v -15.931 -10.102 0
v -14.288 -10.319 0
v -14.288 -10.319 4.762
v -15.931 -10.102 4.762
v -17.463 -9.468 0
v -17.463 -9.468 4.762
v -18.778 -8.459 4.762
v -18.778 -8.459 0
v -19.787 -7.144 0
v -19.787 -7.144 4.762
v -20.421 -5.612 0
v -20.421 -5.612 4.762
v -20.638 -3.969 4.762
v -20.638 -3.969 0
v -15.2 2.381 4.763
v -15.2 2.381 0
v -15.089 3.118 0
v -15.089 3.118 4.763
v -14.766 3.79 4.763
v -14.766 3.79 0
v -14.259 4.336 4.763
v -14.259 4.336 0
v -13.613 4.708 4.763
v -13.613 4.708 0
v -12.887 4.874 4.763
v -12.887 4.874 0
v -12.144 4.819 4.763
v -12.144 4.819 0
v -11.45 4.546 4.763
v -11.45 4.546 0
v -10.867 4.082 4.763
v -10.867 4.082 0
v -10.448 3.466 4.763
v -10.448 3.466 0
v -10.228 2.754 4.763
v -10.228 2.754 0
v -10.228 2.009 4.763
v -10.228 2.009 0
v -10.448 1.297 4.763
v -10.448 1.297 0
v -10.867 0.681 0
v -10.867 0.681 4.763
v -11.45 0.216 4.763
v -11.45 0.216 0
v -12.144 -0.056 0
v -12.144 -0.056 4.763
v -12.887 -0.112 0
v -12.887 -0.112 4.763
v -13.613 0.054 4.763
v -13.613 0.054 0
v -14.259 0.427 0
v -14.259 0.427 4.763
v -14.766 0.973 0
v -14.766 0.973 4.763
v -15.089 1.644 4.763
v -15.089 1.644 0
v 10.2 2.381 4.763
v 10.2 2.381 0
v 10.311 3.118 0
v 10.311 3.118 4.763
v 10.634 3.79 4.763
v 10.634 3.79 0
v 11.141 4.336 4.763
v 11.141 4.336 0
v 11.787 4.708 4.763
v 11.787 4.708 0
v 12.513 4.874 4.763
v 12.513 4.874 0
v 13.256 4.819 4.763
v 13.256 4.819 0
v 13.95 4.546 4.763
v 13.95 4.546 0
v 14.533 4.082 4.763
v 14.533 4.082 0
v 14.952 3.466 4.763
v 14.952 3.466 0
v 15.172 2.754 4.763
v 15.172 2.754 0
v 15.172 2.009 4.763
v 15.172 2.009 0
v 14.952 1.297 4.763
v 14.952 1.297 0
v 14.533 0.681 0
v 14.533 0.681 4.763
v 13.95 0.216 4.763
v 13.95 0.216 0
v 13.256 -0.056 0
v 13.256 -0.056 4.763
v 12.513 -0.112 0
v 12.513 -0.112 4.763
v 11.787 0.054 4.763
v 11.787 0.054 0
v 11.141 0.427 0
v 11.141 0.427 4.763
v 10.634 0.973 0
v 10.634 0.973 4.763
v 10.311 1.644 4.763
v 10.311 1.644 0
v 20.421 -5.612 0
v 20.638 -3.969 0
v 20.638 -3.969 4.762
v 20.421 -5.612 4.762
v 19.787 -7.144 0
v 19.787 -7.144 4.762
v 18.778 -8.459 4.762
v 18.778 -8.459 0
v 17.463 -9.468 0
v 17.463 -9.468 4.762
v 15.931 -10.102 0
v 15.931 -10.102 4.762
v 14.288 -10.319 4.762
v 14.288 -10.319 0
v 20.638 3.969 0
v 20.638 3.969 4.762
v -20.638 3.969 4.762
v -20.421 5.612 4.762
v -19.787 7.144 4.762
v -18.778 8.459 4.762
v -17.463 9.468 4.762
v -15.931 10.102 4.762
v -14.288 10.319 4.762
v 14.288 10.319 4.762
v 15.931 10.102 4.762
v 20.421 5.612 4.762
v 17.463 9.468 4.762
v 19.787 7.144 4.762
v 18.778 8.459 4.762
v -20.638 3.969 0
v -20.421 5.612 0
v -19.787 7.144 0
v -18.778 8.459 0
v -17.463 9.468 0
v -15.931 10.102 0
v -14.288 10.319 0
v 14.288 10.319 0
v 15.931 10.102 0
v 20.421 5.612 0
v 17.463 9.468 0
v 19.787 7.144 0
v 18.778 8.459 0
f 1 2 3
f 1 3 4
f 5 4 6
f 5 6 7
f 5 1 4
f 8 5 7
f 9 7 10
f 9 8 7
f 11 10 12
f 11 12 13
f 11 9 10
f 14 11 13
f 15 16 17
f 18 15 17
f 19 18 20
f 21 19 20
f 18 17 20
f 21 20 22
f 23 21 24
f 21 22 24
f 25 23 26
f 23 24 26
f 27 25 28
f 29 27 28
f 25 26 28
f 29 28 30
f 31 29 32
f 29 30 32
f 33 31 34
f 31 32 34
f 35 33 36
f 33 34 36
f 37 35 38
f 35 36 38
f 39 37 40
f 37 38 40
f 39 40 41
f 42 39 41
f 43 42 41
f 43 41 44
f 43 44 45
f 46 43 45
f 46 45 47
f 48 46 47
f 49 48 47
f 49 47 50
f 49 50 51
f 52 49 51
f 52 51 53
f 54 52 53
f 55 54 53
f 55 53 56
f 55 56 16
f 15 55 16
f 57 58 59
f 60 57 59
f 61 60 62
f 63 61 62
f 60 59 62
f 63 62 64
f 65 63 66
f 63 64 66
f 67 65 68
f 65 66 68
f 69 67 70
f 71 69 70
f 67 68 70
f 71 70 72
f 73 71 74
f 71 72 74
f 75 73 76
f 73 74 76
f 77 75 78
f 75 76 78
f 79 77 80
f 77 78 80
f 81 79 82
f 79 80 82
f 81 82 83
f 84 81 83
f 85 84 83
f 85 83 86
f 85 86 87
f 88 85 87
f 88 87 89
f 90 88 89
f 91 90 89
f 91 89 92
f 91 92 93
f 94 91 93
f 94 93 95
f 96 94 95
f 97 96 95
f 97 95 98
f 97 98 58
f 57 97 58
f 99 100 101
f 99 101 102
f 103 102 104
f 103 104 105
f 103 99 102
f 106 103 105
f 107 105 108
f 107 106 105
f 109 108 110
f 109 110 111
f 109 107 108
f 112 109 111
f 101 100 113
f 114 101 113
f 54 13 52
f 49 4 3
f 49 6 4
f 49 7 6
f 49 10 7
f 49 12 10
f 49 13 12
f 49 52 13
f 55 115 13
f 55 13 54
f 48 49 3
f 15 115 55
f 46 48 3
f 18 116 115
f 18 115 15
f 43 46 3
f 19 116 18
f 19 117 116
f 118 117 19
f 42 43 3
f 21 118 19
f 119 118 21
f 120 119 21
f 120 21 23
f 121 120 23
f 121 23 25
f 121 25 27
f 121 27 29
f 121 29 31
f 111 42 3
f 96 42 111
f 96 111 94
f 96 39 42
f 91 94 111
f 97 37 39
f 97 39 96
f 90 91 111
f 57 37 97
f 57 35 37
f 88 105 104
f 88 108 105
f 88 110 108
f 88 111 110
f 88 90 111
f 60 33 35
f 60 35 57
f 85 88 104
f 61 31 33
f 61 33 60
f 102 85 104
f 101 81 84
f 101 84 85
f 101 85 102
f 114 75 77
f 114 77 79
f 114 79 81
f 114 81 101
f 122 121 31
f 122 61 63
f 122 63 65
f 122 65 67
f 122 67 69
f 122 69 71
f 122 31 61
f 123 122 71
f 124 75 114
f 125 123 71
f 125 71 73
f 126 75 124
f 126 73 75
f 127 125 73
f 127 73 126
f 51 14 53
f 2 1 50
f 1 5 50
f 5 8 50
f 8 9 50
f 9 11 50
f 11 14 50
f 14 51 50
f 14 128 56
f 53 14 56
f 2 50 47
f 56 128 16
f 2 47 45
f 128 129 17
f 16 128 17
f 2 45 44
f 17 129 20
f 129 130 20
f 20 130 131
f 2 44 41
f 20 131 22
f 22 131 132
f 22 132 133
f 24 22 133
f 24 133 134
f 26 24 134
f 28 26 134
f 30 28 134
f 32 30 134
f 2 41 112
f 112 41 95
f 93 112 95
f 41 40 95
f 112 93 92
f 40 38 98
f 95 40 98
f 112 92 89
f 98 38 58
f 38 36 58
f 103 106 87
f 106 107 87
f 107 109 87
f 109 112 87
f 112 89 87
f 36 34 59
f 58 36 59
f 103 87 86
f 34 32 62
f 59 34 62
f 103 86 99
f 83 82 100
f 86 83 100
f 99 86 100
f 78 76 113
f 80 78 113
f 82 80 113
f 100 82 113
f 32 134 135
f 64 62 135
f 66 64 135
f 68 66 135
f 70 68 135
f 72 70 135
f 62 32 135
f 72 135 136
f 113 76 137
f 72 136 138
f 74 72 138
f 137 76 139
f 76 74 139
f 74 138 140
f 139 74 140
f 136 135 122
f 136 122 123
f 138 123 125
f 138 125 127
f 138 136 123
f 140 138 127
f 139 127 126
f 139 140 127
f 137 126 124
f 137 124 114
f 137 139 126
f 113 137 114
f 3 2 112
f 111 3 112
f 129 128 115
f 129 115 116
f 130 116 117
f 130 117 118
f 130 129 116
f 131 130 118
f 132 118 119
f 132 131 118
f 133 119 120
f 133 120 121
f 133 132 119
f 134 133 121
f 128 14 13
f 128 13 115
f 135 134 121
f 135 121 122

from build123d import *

# Parameters (mm, degrees)
SKETCH1_W             = 41.275
SKETCH1_H             = 20.6375
BASE_FLANGE1_DEPTH    = 4.7625
BREAK_CORNER1_DEPTH   = 4.7625
M6X1_0_TAPPED_HOLE1_D = 5


# Read off the part's stored shape, not the designer's step: Break-Corner1
# Sheet-metal steps are written as plain solids
with BuildPart() as part:
    # Sketch1 → Base-Flange1 (new body)
    with BuildSketch(Plane.XY):
        Rectangle(SKETCH1_W, SKETCH1_H)
    extrude(amount=BASE_FLANGE1_DEPTH)

    # Break-Corner1 outline → Break-Corner1 (cut)
    with BuildSketch(Plane.XY):
        with BuildLine():
            Line((-20.6375, 10.31875), (-20.6375, 3.96875))
            ThreePointArc((-20.6375, 3.96875), (-18.777628061, 8.458878061), (-14.2875, 10.31875))
            Line((-14.2875, 10.31875), (-20.6375, 10.31875))
        make_face()
        with BuildLine():
            ThreePointArc((-14.2875, -10.31875), (-18.777628061, -8.458878061), (-20.6375, -3.96875))
            Line((-20.6375, -3.96875), (-20.6375, -10.31875))
            Line((-20.6375, -10.31875), (-14.2875, -10.31875))
        make_face()
        with BuildLine():
            Line((20.6375, 10.31875), (14.2875, 10.31875))
            ThreePointArc((14.2875, 10.31875), (18.777628061, 8.458878061), (20.6375, 3.96875))
            Line((20.6375, 3.96875), (20.6375, 10.31875))
        make_face()
        with BuildLine():
            ThreePointArc((20.6375, -3.96875), (18.777628061, -8.458878061), (14.2875, -10.31875))
            Line((14.2875, -10.31875), (20.6375, -10.31875))
            Line((20.6375, -10.31875), (20.6375, -3.96875))
        make_face()
    extrude(amount=BREAK_CORNER1_DEPTH, mode=Mode.SUBTRACT)

    # M6x1.0 Tapped Hole1 (through all)
    with Locations(Plane.XY.offset(4.7625)):
        with Locations((-12.7, 2.38125), (12.7, 2.38125)):
            Hole(M6X1_0_TAPPED_HOLE1_D / 2)


solid = part.part
